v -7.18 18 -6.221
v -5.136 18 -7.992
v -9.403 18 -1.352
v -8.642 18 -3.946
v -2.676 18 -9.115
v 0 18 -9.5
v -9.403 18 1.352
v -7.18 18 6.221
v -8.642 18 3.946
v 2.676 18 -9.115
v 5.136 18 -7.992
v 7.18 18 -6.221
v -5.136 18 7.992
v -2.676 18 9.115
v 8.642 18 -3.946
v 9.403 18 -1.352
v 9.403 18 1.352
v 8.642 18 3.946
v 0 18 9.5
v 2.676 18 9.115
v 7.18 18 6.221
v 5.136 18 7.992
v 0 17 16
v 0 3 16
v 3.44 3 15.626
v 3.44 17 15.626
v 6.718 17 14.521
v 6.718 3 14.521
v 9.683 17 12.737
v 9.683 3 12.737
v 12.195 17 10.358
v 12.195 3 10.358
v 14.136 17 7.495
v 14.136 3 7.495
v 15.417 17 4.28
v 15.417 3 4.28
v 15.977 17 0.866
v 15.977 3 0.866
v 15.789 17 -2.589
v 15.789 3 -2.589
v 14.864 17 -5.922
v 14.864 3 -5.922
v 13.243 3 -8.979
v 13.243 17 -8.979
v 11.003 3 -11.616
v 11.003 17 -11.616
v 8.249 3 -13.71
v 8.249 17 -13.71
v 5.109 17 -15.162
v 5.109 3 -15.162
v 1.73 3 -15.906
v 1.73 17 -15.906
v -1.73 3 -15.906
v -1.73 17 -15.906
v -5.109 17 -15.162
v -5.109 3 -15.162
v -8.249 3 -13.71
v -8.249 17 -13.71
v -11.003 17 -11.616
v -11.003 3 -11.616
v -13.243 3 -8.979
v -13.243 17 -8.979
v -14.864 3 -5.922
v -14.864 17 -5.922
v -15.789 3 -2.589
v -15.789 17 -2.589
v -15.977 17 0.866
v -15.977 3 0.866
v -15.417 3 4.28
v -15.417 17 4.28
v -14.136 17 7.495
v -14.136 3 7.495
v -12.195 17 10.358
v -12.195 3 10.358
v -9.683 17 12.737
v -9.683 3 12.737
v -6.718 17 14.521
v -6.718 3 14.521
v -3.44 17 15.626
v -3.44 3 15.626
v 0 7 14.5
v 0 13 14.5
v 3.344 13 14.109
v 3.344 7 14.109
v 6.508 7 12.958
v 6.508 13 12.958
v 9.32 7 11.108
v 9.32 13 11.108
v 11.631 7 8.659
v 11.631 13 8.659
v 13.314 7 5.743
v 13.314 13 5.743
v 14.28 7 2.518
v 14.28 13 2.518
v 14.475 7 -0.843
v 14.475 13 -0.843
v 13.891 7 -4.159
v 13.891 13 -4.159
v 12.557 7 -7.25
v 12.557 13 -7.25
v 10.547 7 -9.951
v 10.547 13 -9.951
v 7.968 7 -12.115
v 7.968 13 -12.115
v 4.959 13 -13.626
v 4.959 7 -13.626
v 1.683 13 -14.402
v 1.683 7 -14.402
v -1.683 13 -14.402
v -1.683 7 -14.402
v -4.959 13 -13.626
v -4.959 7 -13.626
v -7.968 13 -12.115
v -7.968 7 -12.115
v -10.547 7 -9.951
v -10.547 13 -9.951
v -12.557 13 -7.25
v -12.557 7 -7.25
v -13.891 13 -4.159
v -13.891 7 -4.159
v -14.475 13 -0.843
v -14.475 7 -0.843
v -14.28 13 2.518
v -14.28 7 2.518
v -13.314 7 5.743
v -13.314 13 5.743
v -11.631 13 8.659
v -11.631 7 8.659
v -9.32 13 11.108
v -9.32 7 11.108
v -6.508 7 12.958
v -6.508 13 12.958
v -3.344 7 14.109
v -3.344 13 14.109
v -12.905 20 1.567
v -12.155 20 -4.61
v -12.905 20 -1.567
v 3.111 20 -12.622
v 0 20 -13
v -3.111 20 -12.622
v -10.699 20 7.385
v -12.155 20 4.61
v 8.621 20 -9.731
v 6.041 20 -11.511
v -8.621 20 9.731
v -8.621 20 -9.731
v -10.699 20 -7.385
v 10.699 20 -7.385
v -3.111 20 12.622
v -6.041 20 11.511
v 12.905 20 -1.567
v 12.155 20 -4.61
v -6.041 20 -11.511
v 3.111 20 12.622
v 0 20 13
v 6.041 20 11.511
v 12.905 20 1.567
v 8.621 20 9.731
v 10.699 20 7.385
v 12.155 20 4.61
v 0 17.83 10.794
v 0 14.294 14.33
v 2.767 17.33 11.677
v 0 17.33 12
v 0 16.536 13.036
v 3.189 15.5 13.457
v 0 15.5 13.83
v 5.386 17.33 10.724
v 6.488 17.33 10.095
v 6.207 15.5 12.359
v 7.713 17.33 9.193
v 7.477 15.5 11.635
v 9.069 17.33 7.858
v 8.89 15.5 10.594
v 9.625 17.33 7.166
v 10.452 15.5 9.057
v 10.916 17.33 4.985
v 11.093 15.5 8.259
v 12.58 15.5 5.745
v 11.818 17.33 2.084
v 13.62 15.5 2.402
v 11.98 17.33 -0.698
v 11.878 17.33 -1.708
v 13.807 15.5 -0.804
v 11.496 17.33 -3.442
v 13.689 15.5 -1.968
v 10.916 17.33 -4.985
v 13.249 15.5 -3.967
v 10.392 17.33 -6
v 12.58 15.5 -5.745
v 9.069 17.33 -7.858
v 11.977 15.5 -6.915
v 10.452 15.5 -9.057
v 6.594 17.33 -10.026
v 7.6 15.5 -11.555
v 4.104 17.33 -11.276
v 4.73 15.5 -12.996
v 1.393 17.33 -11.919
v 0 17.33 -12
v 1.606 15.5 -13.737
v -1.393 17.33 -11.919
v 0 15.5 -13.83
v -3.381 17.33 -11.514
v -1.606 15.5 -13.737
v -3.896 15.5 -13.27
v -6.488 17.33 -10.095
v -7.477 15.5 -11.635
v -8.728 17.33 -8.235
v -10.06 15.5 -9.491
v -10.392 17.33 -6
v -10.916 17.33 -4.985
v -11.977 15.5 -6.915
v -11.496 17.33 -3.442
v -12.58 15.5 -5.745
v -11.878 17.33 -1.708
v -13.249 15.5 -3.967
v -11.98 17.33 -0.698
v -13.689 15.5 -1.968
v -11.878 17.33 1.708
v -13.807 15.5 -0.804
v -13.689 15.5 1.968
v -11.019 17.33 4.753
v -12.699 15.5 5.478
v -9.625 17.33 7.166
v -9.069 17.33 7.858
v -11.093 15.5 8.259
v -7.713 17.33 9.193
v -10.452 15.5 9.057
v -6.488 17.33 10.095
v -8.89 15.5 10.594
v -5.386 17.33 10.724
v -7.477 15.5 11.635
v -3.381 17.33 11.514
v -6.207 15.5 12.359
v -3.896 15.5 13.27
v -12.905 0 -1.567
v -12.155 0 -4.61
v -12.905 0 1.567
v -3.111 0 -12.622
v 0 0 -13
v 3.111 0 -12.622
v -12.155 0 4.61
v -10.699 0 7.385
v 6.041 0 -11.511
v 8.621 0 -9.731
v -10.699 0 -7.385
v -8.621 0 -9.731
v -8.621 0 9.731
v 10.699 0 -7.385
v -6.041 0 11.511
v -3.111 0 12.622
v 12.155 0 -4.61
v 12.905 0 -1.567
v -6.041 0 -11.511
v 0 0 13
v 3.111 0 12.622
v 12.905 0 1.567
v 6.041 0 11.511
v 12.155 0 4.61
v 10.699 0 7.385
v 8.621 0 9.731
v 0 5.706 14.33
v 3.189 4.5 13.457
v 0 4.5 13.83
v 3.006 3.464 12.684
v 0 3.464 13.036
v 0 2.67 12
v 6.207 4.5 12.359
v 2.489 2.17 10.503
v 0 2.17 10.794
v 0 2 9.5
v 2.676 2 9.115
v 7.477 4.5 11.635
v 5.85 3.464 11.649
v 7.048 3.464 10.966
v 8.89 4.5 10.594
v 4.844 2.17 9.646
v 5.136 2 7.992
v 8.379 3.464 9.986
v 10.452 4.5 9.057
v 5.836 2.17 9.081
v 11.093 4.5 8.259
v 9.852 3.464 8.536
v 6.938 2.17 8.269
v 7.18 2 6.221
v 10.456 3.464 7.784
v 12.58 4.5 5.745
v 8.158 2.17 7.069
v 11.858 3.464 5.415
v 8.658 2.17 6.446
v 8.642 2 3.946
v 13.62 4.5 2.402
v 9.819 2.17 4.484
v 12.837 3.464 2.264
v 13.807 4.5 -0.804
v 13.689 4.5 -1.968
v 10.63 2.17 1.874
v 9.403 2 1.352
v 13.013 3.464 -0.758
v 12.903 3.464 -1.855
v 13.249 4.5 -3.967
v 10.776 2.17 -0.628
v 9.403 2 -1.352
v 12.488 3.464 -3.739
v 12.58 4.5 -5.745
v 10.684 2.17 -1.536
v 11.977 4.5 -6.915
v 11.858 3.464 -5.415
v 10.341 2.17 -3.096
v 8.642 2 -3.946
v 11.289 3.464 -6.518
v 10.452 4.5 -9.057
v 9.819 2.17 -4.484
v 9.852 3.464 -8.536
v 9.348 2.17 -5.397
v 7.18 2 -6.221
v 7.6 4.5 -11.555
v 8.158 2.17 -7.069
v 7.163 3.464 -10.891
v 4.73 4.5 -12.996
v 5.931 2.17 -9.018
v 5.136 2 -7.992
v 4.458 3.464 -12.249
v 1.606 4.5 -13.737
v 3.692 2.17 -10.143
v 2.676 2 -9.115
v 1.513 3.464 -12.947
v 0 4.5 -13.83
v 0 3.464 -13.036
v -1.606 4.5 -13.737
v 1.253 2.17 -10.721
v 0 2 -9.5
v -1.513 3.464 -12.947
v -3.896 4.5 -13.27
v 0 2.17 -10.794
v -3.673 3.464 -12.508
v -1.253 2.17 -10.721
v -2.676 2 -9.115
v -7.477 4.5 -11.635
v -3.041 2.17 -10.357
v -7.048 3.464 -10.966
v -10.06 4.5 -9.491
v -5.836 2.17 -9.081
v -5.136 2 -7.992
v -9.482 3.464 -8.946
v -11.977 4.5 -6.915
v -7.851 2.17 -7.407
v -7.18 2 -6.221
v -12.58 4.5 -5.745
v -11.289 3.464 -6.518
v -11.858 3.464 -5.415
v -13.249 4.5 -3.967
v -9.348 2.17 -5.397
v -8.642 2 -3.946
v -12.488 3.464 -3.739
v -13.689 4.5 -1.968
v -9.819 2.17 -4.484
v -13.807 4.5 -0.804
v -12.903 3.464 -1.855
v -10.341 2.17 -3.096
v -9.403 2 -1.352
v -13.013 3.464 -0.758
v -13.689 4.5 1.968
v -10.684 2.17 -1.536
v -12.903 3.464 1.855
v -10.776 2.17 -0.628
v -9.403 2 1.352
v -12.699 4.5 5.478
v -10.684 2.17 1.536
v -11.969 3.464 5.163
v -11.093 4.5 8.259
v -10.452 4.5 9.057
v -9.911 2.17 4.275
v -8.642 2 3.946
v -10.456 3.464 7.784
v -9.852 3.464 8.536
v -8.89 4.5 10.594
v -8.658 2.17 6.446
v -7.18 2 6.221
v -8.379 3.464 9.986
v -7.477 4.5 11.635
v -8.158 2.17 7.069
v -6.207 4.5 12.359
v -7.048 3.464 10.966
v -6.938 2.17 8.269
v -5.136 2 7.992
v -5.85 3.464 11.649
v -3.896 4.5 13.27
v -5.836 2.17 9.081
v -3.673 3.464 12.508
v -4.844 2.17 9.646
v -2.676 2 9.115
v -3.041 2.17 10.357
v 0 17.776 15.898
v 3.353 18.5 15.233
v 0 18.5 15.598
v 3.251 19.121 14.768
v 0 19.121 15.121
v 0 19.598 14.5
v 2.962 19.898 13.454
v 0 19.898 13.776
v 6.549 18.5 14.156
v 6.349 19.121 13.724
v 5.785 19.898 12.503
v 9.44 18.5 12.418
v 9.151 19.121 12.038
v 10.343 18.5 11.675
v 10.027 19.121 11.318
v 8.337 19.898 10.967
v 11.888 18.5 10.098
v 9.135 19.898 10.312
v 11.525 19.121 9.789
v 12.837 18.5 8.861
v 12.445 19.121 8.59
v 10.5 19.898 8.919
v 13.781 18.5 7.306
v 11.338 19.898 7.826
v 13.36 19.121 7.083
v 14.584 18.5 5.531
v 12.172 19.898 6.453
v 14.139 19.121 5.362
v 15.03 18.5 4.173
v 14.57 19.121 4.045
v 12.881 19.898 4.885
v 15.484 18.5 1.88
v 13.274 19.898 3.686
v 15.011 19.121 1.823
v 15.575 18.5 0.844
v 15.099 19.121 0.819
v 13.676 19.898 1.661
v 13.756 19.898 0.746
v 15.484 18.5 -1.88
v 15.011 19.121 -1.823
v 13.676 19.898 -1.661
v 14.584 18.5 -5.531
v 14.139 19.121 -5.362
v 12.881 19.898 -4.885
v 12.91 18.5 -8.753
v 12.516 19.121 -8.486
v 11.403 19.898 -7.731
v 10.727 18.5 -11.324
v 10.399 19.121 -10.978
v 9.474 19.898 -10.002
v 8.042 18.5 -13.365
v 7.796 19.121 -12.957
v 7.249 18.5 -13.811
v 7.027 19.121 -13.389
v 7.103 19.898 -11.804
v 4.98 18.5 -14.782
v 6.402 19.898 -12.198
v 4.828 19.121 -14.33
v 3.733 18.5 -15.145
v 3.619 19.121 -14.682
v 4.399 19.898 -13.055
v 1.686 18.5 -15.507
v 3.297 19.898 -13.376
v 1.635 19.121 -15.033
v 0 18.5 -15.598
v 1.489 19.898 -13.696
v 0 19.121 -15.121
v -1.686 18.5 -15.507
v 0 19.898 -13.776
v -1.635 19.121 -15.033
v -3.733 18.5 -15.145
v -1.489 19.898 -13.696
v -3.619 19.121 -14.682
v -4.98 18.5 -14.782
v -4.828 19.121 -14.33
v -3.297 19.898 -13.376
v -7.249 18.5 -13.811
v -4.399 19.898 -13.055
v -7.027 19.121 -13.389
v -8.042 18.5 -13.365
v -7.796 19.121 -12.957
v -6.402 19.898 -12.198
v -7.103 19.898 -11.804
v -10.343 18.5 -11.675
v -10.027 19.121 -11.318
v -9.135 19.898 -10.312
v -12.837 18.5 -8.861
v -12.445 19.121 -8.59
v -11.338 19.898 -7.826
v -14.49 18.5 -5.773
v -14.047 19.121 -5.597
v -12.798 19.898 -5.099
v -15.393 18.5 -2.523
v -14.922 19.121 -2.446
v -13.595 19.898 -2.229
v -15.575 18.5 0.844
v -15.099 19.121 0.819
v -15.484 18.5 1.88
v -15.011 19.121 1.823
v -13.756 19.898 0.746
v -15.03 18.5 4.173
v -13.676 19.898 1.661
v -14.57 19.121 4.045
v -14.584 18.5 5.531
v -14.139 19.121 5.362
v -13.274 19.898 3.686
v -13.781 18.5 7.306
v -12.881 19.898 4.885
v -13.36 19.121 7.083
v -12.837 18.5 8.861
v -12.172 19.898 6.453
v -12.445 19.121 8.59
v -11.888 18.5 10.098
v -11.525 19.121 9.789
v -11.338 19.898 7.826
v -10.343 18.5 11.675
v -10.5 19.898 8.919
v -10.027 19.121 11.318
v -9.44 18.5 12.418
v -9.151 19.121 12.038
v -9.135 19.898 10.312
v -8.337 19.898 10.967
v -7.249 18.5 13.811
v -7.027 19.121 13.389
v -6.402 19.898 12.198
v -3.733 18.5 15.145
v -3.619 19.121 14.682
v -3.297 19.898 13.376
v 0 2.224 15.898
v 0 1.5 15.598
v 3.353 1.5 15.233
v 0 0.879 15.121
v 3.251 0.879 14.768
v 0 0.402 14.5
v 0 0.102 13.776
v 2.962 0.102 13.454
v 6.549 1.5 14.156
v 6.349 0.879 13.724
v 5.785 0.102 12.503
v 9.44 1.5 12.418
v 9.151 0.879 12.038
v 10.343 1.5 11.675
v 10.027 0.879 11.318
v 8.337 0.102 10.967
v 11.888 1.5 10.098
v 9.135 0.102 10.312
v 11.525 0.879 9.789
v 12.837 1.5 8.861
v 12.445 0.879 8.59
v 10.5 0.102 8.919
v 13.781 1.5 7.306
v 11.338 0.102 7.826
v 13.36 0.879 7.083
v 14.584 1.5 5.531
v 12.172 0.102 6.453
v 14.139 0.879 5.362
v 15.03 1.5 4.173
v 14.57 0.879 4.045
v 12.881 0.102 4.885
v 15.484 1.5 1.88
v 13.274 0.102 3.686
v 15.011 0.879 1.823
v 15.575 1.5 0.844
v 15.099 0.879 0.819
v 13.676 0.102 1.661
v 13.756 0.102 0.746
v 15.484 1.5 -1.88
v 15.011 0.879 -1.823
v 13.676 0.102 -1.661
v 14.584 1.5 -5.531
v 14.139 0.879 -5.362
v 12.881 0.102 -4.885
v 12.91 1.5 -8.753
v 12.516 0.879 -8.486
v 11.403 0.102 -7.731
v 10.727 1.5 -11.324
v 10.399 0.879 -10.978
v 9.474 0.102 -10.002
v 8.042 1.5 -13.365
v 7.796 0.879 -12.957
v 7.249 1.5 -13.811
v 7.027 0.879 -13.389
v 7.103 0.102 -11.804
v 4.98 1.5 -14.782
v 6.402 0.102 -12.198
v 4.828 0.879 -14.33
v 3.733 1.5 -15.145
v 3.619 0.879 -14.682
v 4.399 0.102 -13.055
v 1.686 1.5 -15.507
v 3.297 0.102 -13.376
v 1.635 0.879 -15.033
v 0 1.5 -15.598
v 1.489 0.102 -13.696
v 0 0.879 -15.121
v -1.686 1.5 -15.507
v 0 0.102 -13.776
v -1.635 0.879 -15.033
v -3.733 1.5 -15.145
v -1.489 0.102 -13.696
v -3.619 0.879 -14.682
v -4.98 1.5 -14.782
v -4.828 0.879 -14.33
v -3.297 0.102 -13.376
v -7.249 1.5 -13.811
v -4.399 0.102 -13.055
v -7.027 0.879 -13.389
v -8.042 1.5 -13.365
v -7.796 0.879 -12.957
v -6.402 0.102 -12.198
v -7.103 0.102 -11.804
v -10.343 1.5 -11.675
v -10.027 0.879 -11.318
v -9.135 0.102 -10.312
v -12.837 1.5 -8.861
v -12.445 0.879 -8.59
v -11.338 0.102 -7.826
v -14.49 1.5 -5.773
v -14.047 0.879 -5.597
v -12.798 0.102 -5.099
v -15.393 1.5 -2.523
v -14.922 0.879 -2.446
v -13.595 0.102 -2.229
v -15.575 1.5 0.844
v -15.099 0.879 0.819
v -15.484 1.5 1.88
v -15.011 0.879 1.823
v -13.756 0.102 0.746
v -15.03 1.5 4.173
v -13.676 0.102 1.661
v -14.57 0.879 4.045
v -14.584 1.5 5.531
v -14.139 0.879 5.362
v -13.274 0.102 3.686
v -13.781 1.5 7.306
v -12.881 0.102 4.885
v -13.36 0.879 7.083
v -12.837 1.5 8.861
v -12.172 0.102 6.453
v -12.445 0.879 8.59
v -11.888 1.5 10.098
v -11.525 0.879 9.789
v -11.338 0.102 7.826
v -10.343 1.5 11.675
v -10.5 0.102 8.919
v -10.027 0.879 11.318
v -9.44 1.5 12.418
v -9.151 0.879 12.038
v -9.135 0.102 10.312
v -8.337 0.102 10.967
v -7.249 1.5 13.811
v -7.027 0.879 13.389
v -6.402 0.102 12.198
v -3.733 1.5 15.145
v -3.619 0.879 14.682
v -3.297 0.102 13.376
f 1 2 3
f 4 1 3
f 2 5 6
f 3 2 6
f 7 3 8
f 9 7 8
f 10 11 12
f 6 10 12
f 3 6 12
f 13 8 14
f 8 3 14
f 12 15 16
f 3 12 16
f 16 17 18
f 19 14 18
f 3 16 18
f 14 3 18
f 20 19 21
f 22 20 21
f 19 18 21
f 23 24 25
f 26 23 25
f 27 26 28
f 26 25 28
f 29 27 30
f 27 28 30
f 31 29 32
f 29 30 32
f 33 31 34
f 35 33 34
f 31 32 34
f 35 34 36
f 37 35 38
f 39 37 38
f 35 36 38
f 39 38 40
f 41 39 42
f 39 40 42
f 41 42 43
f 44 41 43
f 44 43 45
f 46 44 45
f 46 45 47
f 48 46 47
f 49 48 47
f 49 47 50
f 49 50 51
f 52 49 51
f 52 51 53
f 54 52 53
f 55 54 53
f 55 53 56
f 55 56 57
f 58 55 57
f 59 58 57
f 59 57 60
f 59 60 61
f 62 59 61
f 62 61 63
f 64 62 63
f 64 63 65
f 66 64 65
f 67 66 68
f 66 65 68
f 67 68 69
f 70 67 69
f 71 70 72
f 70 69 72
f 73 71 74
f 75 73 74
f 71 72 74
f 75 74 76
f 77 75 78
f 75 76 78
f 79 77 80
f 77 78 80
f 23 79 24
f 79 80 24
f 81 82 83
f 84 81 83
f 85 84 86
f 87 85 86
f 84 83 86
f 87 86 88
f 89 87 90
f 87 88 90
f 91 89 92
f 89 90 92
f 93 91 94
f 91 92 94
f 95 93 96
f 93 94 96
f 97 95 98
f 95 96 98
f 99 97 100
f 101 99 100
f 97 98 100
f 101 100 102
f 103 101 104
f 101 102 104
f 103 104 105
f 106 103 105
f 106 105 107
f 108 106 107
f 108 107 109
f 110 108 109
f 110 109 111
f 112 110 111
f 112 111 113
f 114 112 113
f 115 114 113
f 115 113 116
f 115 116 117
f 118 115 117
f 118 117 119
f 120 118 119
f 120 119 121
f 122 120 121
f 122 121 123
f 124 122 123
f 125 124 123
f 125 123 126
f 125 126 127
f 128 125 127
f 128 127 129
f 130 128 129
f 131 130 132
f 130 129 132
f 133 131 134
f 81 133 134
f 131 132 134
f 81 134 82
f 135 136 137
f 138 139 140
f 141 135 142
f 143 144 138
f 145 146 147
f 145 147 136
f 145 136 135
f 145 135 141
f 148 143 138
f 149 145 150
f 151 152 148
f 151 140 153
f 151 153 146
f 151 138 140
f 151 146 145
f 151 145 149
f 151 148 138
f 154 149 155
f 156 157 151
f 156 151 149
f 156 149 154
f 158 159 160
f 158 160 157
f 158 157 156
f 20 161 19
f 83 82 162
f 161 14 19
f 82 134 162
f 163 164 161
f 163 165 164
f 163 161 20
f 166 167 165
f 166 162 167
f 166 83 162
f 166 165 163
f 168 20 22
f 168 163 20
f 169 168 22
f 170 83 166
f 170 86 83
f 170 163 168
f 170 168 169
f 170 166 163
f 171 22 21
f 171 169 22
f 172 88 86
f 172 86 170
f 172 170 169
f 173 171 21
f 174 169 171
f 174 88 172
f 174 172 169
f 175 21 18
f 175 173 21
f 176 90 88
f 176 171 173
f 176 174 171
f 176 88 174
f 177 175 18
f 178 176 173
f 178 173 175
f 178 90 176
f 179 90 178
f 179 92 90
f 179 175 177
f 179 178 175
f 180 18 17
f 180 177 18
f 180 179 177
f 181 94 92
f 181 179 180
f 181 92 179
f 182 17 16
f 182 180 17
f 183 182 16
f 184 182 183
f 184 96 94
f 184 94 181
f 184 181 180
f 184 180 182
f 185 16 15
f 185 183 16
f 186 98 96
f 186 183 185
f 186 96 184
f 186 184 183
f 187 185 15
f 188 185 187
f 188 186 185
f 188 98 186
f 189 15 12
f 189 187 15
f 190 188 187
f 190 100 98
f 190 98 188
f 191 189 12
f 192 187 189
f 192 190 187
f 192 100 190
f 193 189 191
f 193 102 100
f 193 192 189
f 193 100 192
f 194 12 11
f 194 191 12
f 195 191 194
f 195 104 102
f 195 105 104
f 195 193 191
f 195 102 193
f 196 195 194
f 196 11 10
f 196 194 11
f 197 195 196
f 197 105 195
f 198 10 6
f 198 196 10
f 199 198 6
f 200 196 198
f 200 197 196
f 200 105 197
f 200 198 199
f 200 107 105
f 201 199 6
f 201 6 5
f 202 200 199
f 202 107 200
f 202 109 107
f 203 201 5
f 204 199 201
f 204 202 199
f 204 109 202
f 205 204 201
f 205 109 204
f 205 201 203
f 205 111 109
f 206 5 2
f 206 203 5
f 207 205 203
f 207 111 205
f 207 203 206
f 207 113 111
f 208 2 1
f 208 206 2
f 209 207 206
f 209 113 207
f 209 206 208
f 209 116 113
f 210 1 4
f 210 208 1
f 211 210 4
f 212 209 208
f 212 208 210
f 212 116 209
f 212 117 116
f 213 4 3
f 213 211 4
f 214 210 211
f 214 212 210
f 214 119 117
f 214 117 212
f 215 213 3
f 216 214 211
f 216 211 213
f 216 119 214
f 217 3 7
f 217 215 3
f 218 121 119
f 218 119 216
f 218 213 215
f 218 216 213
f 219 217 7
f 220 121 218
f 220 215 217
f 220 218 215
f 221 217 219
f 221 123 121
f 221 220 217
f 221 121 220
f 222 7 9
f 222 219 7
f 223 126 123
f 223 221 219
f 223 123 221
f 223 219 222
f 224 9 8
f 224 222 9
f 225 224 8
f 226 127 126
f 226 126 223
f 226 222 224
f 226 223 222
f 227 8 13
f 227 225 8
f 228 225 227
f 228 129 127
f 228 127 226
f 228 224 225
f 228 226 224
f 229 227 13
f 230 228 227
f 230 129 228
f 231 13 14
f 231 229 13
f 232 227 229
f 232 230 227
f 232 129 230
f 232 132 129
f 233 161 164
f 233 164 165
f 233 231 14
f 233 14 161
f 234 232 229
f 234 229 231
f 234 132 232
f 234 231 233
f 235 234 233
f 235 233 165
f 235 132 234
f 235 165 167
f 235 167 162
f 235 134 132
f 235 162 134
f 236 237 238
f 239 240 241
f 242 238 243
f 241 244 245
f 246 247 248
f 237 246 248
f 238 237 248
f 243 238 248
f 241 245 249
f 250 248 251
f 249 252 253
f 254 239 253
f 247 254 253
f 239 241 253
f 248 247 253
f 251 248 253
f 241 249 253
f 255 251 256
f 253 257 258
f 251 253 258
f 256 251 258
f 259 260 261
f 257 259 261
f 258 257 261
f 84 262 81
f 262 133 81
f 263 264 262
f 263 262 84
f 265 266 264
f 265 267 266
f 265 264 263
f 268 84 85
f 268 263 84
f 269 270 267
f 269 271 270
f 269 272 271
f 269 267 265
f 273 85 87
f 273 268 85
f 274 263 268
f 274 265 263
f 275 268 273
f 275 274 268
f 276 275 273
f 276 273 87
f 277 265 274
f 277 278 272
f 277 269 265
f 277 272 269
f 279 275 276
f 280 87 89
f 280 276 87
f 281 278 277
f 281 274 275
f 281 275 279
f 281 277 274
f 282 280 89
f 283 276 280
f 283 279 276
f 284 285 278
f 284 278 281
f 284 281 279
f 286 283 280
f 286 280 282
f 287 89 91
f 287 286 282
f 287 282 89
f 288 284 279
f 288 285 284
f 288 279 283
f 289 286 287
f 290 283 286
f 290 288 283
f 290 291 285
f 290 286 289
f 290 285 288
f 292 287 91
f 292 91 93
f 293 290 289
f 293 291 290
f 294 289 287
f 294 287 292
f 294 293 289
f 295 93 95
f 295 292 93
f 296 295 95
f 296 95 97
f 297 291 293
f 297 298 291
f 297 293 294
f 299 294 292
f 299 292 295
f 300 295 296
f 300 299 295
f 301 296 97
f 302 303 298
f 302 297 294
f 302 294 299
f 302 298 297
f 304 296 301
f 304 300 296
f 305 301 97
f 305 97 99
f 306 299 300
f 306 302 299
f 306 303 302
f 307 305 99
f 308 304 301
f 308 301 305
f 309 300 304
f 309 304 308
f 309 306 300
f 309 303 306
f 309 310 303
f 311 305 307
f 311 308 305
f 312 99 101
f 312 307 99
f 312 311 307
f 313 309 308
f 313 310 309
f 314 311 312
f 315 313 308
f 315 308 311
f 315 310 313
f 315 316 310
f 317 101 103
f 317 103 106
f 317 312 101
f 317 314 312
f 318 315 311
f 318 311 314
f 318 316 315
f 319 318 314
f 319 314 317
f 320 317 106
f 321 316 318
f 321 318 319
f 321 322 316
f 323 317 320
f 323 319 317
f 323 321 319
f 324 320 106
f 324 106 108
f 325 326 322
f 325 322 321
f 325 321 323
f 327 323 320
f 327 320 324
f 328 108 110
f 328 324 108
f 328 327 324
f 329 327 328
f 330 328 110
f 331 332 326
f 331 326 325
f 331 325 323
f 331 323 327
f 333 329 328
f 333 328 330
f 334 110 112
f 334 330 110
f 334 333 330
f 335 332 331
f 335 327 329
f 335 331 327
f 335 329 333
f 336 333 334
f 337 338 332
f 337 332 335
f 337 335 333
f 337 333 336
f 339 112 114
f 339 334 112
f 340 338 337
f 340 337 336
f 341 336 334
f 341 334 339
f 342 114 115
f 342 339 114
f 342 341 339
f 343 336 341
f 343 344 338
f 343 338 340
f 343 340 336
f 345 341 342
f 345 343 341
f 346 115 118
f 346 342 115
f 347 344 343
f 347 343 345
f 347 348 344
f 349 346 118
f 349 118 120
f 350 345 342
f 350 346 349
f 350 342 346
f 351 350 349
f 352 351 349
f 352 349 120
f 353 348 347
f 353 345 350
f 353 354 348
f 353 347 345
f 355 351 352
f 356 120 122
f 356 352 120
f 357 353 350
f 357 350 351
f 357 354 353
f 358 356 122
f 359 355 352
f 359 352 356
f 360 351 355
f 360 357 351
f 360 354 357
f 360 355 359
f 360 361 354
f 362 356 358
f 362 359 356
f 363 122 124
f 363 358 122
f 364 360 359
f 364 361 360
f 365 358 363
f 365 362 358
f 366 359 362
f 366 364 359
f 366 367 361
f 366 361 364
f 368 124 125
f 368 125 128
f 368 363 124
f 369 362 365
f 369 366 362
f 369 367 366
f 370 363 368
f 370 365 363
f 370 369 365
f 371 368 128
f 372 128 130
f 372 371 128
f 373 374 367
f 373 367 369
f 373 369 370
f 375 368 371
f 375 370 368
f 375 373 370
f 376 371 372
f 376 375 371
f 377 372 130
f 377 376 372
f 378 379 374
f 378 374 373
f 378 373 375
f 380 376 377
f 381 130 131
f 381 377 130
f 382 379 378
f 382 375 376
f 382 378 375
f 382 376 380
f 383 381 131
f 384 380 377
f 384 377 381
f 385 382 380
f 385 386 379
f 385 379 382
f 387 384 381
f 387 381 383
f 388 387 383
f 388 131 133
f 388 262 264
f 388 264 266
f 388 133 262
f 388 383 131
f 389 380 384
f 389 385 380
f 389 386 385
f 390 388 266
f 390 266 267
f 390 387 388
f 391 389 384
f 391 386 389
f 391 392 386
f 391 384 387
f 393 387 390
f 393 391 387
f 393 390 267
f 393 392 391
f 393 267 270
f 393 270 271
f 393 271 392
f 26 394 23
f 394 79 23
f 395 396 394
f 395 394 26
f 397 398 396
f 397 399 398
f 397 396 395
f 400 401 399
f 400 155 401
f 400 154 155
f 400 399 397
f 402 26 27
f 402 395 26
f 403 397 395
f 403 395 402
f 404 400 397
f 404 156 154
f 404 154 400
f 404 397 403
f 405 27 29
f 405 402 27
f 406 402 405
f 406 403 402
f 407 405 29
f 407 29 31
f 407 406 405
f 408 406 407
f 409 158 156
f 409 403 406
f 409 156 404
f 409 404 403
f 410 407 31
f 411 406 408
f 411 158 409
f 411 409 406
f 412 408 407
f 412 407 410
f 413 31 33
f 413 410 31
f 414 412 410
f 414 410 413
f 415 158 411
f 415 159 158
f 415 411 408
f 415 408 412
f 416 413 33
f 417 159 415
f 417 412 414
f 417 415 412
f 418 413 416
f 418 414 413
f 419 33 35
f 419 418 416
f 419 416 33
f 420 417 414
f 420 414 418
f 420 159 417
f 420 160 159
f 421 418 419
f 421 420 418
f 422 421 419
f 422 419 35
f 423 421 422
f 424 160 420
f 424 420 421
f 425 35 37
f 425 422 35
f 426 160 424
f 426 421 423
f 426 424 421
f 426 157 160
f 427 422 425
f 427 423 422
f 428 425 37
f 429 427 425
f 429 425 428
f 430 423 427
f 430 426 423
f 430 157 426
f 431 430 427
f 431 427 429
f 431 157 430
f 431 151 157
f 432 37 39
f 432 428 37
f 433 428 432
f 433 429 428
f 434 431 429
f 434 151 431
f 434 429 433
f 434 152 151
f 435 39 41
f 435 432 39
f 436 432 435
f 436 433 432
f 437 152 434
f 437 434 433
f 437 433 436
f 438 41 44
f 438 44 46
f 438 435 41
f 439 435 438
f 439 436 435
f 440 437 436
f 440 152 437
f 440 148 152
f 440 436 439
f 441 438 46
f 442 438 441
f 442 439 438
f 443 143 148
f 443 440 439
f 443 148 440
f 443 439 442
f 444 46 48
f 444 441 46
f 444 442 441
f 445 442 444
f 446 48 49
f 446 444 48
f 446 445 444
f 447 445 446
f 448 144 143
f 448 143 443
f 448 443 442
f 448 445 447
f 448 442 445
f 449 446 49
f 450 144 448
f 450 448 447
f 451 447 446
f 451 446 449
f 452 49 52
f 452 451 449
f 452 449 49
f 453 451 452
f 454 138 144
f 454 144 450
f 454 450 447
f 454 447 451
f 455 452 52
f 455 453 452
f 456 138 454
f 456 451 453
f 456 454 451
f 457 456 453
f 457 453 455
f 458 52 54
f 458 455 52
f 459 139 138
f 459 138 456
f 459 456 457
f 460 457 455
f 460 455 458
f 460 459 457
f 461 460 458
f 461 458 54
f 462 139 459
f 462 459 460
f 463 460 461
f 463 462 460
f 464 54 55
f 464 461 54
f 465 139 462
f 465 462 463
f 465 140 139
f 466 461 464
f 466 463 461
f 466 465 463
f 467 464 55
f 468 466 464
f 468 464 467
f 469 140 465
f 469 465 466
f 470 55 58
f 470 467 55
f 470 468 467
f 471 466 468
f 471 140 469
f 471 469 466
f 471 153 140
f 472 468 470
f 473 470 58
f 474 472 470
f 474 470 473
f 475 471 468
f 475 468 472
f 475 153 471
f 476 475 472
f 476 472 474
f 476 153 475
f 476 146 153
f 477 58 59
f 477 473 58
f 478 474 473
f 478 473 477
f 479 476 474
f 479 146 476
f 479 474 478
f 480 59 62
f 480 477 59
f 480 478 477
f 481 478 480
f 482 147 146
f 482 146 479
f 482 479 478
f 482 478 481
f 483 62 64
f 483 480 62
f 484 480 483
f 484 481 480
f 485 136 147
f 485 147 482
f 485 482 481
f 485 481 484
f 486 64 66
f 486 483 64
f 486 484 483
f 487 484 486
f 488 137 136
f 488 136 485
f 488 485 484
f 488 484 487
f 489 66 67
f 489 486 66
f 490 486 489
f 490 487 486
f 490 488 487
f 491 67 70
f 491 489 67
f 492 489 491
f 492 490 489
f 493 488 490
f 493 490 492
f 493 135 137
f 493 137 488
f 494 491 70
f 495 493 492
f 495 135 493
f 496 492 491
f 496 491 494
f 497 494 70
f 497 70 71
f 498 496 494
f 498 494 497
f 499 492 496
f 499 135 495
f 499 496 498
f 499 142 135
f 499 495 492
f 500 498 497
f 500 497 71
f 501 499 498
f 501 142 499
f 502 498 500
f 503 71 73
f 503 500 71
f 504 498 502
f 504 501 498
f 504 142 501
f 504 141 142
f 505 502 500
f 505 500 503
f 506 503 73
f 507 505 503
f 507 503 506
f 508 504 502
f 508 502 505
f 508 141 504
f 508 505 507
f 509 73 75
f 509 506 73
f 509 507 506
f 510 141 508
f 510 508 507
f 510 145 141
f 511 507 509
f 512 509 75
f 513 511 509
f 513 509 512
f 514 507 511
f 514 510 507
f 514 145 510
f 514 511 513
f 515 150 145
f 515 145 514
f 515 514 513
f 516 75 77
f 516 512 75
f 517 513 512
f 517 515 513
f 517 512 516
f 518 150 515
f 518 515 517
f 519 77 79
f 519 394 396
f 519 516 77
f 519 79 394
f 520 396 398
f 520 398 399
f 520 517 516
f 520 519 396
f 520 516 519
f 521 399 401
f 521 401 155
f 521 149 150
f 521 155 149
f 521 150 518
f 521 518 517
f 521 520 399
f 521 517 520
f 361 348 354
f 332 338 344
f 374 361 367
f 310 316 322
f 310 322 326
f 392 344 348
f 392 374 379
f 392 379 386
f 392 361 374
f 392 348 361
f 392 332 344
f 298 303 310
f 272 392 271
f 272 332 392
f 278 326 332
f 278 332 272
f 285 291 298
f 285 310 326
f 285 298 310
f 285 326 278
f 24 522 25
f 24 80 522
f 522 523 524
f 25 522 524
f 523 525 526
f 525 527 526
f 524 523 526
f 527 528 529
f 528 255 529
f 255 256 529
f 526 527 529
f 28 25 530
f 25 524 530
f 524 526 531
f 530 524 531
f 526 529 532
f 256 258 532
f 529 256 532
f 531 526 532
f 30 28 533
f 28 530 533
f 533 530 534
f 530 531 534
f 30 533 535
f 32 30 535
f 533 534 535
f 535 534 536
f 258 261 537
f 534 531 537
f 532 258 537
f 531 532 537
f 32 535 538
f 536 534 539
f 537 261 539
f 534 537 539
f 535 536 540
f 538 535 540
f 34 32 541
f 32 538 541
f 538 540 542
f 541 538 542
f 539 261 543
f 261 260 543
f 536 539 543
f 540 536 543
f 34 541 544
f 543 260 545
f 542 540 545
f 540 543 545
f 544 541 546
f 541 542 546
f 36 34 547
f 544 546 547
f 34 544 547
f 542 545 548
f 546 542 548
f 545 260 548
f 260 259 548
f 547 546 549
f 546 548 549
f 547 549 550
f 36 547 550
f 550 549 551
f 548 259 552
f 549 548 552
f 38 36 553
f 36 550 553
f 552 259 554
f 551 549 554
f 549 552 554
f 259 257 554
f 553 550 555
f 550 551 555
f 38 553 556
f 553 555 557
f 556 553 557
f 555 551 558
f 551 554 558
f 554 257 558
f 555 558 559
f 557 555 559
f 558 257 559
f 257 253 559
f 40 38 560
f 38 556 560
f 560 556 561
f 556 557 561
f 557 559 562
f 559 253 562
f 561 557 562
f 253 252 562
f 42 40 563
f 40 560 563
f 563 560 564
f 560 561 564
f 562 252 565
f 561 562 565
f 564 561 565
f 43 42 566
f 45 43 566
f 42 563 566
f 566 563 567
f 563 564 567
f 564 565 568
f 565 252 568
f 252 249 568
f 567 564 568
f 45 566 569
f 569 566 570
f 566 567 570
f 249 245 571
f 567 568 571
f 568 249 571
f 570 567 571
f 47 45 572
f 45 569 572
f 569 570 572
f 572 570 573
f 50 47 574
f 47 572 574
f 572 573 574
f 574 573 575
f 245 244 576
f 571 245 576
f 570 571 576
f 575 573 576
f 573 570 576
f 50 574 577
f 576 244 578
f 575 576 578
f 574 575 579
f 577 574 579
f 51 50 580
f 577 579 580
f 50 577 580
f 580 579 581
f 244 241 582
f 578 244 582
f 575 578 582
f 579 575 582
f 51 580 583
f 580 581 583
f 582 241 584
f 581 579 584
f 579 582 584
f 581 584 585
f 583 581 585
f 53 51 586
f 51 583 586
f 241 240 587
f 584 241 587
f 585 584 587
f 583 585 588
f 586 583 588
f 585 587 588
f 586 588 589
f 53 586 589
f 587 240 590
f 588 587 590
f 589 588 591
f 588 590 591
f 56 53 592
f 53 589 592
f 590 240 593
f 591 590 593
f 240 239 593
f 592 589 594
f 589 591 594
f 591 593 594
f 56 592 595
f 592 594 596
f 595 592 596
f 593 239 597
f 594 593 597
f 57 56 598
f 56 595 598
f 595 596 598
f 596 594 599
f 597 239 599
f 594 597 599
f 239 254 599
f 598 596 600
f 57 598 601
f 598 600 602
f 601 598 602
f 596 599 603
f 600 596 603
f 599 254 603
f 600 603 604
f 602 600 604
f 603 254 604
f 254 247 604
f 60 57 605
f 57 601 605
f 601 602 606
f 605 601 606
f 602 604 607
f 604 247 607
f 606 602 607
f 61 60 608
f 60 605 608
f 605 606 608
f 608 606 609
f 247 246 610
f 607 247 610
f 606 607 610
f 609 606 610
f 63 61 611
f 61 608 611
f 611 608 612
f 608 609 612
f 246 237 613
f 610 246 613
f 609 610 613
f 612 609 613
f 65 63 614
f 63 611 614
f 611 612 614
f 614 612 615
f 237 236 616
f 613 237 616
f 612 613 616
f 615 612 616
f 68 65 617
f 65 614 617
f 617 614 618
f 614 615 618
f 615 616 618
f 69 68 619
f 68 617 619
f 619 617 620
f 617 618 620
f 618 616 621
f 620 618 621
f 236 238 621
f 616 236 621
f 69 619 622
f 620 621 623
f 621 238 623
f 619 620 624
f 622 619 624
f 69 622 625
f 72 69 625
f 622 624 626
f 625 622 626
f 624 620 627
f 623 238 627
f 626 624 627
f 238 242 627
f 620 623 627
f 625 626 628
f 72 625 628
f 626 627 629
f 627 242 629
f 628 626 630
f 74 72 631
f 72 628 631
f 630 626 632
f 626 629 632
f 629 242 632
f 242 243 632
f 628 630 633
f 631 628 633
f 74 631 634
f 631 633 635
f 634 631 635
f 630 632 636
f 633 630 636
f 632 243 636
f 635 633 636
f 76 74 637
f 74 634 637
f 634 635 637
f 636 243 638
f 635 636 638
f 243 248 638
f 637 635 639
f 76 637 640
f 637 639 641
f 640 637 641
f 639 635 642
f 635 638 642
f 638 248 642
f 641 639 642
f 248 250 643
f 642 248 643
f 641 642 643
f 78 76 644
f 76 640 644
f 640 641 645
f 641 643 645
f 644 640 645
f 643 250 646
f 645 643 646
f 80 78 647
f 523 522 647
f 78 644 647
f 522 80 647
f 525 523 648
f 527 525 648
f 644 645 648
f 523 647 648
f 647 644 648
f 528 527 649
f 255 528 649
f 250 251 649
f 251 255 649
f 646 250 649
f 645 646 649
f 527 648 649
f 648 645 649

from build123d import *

# Parameters (mm, degrees)
SKETCH1_R           = 16
BOSS_EXTRUDE1_DEPTH = 20
SKETCH2_R           = 14.5
CUT_EXTRUDE1_DEPTH  = 18
BOSS_EXTRUDE2_START = -2
SKETCH3_R           = 16
BOSS_EXTRUDE2_DEPTH = 2
FILLET1_R           = 5
FILLET2_R           = 3


with BuildPart() as part:
    # Sketch1 → Boss-Extrude1 (new body)
    with BuildSketch(Plane(origin=(0, 0, 0), x_dir=(1, 0, 0), z_dir=(0, 1, 0))):
        with Locations(Location((0, 0, 0), (0, 0, 270))):
            Circle(SKETCH1_R)
    extrude(amount=BOSS_EXTRUDE1_DEPTH)

    # Sketch2 → Cut-Extrude1 (cut)
    with BuildSketch(Plane(origin=(0, 20, 0), x_dir=(1, 0, 0), z_dir=(0, 1, 0))):
        with Locations(Location((0, 0, 0), (0, 0, 270))):
            Circle(SKETCH2_R)
    extrude(amount=-CUT_EXTRUDE1_DEPTH, mode=Mode.SUBTRACT)

    # Sketch3 → Boss-Extrude2 (add)
    with BuildSketch(Plane(origin=(0, 20, 0), x_dir=(1, 0, 0), z_dir=(0, 1, 0)).offset(BOSS_EXTRUDE2_START)):
        with Locations(Location((0, 0, 0), (0, 0, 270))):
            Circle(SKETCH3_R)
    extrude(amount=BOSS_EXTRUDE2_DEPTH)

    # Fillet1
    fillet1_edges = [part.edges().sort_by_distance(p)[0] for p in [
        (0, 18, -14.5),
        (0, 2, -14.5),
    ]]
    fillet(fillet1_edges, radius=FILLET1_R)

    # Fillet2
    fillet2_edges = [part.edges().sort_by_distance(p)[0] for p in [
        (0, 0, -16),
        (0, 20, -16),
    ]]
    fillet(fillet2_edges, radius=FILLET2_R)


solid = part.part
